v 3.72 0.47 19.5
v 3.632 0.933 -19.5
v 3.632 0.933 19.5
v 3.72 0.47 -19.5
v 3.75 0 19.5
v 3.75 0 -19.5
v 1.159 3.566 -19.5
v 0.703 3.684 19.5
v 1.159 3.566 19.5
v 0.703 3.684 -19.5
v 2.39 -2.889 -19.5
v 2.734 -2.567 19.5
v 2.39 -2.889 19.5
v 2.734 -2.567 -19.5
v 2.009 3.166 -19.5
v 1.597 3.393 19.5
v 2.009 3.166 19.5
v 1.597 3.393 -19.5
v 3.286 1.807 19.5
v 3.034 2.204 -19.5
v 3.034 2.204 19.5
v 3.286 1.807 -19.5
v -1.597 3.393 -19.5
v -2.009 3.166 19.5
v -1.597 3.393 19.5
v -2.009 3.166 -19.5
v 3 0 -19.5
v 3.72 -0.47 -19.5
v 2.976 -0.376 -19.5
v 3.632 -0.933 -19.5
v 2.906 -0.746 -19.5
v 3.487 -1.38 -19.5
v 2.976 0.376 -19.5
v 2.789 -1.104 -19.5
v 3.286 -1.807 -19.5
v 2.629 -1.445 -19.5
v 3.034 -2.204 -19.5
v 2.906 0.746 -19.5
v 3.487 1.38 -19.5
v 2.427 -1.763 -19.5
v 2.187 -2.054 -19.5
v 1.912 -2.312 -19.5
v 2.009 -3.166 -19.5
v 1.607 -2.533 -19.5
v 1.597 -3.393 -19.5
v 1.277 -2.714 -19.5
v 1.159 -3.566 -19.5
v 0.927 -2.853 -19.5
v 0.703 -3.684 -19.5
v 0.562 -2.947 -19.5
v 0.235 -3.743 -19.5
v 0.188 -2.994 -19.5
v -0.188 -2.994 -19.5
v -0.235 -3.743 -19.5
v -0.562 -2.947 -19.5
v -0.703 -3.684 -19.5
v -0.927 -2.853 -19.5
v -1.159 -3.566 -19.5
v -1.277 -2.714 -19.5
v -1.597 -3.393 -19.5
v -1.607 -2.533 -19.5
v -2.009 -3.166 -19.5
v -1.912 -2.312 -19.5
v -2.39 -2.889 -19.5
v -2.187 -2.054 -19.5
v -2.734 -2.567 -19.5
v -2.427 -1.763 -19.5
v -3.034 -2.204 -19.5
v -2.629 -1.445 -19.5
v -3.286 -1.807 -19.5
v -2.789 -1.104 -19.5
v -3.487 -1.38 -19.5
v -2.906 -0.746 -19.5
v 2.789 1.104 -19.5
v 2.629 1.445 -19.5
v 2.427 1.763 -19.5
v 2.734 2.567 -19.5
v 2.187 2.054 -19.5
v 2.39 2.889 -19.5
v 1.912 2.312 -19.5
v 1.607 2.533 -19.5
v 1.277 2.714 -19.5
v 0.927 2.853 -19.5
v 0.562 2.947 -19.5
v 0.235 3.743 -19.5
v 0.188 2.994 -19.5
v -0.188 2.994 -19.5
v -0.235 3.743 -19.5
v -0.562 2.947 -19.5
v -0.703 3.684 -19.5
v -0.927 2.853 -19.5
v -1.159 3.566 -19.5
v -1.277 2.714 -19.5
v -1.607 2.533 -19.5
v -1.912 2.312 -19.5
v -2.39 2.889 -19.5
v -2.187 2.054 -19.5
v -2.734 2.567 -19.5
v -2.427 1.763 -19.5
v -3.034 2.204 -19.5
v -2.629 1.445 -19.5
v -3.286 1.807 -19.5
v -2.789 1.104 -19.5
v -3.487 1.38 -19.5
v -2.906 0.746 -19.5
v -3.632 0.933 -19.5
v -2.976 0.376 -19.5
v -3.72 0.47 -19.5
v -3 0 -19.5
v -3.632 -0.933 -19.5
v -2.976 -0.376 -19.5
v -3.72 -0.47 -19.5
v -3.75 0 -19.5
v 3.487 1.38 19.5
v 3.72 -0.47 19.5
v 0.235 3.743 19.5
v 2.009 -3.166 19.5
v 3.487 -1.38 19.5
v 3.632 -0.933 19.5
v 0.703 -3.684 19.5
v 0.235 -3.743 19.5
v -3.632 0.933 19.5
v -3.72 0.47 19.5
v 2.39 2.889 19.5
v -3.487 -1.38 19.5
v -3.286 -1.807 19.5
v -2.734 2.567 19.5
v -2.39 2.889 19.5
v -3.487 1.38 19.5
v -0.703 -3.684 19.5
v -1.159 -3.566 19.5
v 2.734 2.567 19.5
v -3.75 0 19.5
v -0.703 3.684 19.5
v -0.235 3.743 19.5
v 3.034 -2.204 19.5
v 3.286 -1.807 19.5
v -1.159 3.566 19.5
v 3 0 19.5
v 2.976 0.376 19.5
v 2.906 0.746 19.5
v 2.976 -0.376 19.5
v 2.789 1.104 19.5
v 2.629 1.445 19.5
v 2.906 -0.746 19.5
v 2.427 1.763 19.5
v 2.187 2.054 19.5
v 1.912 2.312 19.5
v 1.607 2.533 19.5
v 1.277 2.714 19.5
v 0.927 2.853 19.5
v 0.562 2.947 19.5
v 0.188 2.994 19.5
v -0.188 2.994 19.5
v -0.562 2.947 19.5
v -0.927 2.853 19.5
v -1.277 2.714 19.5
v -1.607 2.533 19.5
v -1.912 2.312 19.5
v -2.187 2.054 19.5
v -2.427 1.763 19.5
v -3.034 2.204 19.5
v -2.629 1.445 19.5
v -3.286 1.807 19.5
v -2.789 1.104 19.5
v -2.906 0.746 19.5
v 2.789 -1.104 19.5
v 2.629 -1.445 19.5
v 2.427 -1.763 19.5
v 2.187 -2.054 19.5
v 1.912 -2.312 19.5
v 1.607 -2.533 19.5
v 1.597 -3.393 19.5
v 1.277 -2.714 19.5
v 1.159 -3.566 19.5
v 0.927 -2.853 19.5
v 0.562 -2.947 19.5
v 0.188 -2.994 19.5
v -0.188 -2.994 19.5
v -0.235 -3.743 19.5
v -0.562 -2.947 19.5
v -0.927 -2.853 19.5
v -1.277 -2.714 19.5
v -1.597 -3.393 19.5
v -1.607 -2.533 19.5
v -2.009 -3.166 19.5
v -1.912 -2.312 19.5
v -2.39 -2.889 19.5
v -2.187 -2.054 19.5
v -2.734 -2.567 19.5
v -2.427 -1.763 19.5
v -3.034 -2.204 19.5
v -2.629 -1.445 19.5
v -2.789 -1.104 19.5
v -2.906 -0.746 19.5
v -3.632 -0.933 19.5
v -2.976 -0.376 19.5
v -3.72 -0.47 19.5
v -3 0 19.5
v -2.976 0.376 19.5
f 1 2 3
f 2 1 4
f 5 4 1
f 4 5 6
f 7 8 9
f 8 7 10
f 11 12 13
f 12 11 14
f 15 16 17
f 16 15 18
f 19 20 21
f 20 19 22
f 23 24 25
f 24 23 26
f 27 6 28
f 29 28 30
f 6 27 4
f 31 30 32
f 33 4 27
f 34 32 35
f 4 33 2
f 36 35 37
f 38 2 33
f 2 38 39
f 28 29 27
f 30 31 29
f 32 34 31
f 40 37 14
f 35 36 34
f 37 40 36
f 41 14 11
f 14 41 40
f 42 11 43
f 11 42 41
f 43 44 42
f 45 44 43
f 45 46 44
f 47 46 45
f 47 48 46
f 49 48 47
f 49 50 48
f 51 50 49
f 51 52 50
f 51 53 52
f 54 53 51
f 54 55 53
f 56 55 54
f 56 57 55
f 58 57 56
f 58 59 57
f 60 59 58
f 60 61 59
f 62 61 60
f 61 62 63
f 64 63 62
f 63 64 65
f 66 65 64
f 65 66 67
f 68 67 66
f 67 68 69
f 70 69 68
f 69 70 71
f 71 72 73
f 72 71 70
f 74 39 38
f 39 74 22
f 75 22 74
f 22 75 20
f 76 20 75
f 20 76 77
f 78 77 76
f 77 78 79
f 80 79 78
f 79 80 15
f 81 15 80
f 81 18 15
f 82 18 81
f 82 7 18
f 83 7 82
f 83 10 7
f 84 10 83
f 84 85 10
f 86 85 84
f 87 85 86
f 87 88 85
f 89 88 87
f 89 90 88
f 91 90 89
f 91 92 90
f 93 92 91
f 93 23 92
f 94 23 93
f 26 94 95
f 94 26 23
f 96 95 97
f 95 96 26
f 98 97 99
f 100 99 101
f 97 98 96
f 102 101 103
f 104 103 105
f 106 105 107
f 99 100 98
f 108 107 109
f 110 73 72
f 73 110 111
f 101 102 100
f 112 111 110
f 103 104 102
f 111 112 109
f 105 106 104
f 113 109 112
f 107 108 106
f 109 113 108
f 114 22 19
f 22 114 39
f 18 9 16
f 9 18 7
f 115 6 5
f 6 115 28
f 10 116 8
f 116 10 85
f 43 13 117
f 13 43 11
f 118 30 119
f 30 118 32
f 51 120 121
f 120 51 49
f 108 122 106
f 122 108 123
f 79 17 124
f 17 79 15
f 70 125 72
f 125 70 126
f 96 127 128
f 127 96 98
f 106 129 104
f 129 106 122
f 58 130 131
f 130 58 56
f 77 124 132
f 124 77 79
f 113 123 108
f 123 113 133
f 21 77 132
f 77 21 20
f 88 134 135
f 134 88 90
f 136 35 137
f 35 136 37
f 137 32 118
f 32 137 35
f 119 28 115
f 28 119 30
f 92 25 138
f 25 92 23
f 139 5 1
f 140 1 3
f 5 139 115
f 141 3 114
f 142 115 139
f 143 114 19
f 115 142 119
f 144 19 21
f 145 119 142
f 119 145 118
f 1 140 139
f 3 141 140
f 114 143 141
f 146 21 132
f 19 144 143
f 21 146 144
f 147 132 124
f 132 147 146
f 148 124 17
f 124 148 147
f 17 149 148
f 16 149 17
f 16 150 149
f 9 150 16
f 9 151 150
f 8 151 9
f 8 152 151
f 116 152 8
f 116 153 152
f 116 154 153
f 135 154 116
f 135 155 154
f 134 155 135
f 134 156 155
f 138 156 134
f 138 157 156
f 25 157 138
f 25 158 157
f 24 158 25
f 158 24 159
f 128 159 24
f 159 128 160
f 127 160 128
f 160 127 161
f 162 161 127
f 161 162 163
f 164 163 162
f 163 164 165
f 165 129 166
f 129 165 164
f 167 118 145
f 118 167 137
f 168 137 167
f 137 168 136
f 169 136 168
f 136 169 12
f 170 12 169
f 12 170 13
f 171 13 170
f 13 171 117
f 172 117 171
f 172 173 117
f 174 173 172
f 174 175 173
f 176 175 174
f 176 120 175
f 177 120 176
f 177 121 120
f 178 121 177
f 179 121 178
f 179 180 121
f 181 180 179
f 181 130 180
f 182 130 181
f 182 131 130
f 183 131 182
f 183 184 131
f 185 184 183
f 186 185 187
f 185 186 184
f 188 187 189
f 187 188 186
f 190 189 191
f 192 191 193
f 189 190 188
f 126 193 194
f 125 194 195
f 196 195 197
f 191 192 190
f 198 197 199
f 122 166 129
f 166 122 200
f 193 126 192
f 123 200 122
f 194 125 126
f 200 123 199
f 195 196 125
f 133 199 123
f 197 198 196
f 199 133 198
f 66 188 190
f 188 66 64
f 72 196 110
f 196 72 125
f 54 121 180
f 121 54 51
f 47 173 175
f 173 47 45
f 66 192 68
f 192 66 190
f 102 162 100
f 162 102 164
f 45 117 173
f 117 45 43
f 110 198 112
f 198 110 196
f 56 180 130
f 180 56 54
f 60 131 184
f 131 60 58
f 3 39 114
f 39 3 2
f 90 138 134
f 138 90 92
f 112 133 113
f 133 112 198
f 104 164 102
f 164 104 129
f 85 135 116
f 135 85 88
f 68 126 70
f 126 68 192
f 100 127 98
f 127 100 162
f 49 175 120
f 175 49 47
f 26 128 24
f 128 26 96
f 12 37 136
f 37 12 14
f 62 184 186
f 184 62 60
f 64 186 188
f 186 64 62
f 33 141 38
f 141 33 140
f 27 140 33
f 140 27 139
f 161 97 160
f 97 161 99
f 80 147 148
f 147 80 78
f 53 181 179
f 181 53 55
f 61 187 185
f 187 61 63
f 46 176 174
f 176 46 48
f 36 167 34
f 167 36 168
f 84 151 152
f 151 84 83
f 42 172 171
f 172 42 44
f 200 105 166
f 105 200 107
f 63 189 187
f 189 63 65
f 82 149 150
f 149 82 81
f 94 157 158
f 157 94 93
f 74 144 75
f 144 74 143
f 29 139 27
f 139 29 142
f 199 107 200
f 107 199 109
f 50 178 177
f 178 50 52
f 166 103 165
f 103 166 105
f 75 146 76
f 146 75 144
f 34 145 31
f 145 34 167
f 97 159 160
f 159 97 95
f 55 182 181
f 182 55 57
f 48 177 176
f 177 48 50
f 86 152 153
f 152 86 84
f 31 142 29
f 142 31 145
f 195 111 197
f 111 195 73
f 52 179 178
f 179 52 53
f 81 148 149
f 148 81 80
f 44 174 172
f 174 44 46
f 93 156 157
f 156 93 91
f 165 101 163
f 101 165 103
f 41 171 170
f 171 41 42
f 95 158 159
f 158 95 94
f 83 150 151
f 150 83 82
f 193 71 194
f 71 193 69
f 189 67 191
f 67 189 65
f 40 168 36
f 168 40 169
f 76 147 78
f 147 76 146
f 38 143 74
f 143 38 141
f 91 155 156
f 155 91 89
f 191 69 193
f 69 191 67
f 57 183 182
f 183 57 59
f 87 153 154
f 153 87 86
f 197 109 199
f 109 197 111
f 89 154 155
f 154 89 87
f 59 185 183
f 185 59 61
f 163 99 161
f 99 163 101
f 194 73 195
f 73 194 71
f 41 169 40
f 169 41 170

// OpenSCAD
$fn = 50;


difference() {
	union() {
		translate(v = [0, 0, -19.5000000000]) {
			cylinder(h = 39, r = 3.7500000000);
		}
	}
	union() {
		translate(v = [0, 0, -100.0000000000]) {
			cylinder(h = 200, r = 3.0000000000);
		}
	}
}
